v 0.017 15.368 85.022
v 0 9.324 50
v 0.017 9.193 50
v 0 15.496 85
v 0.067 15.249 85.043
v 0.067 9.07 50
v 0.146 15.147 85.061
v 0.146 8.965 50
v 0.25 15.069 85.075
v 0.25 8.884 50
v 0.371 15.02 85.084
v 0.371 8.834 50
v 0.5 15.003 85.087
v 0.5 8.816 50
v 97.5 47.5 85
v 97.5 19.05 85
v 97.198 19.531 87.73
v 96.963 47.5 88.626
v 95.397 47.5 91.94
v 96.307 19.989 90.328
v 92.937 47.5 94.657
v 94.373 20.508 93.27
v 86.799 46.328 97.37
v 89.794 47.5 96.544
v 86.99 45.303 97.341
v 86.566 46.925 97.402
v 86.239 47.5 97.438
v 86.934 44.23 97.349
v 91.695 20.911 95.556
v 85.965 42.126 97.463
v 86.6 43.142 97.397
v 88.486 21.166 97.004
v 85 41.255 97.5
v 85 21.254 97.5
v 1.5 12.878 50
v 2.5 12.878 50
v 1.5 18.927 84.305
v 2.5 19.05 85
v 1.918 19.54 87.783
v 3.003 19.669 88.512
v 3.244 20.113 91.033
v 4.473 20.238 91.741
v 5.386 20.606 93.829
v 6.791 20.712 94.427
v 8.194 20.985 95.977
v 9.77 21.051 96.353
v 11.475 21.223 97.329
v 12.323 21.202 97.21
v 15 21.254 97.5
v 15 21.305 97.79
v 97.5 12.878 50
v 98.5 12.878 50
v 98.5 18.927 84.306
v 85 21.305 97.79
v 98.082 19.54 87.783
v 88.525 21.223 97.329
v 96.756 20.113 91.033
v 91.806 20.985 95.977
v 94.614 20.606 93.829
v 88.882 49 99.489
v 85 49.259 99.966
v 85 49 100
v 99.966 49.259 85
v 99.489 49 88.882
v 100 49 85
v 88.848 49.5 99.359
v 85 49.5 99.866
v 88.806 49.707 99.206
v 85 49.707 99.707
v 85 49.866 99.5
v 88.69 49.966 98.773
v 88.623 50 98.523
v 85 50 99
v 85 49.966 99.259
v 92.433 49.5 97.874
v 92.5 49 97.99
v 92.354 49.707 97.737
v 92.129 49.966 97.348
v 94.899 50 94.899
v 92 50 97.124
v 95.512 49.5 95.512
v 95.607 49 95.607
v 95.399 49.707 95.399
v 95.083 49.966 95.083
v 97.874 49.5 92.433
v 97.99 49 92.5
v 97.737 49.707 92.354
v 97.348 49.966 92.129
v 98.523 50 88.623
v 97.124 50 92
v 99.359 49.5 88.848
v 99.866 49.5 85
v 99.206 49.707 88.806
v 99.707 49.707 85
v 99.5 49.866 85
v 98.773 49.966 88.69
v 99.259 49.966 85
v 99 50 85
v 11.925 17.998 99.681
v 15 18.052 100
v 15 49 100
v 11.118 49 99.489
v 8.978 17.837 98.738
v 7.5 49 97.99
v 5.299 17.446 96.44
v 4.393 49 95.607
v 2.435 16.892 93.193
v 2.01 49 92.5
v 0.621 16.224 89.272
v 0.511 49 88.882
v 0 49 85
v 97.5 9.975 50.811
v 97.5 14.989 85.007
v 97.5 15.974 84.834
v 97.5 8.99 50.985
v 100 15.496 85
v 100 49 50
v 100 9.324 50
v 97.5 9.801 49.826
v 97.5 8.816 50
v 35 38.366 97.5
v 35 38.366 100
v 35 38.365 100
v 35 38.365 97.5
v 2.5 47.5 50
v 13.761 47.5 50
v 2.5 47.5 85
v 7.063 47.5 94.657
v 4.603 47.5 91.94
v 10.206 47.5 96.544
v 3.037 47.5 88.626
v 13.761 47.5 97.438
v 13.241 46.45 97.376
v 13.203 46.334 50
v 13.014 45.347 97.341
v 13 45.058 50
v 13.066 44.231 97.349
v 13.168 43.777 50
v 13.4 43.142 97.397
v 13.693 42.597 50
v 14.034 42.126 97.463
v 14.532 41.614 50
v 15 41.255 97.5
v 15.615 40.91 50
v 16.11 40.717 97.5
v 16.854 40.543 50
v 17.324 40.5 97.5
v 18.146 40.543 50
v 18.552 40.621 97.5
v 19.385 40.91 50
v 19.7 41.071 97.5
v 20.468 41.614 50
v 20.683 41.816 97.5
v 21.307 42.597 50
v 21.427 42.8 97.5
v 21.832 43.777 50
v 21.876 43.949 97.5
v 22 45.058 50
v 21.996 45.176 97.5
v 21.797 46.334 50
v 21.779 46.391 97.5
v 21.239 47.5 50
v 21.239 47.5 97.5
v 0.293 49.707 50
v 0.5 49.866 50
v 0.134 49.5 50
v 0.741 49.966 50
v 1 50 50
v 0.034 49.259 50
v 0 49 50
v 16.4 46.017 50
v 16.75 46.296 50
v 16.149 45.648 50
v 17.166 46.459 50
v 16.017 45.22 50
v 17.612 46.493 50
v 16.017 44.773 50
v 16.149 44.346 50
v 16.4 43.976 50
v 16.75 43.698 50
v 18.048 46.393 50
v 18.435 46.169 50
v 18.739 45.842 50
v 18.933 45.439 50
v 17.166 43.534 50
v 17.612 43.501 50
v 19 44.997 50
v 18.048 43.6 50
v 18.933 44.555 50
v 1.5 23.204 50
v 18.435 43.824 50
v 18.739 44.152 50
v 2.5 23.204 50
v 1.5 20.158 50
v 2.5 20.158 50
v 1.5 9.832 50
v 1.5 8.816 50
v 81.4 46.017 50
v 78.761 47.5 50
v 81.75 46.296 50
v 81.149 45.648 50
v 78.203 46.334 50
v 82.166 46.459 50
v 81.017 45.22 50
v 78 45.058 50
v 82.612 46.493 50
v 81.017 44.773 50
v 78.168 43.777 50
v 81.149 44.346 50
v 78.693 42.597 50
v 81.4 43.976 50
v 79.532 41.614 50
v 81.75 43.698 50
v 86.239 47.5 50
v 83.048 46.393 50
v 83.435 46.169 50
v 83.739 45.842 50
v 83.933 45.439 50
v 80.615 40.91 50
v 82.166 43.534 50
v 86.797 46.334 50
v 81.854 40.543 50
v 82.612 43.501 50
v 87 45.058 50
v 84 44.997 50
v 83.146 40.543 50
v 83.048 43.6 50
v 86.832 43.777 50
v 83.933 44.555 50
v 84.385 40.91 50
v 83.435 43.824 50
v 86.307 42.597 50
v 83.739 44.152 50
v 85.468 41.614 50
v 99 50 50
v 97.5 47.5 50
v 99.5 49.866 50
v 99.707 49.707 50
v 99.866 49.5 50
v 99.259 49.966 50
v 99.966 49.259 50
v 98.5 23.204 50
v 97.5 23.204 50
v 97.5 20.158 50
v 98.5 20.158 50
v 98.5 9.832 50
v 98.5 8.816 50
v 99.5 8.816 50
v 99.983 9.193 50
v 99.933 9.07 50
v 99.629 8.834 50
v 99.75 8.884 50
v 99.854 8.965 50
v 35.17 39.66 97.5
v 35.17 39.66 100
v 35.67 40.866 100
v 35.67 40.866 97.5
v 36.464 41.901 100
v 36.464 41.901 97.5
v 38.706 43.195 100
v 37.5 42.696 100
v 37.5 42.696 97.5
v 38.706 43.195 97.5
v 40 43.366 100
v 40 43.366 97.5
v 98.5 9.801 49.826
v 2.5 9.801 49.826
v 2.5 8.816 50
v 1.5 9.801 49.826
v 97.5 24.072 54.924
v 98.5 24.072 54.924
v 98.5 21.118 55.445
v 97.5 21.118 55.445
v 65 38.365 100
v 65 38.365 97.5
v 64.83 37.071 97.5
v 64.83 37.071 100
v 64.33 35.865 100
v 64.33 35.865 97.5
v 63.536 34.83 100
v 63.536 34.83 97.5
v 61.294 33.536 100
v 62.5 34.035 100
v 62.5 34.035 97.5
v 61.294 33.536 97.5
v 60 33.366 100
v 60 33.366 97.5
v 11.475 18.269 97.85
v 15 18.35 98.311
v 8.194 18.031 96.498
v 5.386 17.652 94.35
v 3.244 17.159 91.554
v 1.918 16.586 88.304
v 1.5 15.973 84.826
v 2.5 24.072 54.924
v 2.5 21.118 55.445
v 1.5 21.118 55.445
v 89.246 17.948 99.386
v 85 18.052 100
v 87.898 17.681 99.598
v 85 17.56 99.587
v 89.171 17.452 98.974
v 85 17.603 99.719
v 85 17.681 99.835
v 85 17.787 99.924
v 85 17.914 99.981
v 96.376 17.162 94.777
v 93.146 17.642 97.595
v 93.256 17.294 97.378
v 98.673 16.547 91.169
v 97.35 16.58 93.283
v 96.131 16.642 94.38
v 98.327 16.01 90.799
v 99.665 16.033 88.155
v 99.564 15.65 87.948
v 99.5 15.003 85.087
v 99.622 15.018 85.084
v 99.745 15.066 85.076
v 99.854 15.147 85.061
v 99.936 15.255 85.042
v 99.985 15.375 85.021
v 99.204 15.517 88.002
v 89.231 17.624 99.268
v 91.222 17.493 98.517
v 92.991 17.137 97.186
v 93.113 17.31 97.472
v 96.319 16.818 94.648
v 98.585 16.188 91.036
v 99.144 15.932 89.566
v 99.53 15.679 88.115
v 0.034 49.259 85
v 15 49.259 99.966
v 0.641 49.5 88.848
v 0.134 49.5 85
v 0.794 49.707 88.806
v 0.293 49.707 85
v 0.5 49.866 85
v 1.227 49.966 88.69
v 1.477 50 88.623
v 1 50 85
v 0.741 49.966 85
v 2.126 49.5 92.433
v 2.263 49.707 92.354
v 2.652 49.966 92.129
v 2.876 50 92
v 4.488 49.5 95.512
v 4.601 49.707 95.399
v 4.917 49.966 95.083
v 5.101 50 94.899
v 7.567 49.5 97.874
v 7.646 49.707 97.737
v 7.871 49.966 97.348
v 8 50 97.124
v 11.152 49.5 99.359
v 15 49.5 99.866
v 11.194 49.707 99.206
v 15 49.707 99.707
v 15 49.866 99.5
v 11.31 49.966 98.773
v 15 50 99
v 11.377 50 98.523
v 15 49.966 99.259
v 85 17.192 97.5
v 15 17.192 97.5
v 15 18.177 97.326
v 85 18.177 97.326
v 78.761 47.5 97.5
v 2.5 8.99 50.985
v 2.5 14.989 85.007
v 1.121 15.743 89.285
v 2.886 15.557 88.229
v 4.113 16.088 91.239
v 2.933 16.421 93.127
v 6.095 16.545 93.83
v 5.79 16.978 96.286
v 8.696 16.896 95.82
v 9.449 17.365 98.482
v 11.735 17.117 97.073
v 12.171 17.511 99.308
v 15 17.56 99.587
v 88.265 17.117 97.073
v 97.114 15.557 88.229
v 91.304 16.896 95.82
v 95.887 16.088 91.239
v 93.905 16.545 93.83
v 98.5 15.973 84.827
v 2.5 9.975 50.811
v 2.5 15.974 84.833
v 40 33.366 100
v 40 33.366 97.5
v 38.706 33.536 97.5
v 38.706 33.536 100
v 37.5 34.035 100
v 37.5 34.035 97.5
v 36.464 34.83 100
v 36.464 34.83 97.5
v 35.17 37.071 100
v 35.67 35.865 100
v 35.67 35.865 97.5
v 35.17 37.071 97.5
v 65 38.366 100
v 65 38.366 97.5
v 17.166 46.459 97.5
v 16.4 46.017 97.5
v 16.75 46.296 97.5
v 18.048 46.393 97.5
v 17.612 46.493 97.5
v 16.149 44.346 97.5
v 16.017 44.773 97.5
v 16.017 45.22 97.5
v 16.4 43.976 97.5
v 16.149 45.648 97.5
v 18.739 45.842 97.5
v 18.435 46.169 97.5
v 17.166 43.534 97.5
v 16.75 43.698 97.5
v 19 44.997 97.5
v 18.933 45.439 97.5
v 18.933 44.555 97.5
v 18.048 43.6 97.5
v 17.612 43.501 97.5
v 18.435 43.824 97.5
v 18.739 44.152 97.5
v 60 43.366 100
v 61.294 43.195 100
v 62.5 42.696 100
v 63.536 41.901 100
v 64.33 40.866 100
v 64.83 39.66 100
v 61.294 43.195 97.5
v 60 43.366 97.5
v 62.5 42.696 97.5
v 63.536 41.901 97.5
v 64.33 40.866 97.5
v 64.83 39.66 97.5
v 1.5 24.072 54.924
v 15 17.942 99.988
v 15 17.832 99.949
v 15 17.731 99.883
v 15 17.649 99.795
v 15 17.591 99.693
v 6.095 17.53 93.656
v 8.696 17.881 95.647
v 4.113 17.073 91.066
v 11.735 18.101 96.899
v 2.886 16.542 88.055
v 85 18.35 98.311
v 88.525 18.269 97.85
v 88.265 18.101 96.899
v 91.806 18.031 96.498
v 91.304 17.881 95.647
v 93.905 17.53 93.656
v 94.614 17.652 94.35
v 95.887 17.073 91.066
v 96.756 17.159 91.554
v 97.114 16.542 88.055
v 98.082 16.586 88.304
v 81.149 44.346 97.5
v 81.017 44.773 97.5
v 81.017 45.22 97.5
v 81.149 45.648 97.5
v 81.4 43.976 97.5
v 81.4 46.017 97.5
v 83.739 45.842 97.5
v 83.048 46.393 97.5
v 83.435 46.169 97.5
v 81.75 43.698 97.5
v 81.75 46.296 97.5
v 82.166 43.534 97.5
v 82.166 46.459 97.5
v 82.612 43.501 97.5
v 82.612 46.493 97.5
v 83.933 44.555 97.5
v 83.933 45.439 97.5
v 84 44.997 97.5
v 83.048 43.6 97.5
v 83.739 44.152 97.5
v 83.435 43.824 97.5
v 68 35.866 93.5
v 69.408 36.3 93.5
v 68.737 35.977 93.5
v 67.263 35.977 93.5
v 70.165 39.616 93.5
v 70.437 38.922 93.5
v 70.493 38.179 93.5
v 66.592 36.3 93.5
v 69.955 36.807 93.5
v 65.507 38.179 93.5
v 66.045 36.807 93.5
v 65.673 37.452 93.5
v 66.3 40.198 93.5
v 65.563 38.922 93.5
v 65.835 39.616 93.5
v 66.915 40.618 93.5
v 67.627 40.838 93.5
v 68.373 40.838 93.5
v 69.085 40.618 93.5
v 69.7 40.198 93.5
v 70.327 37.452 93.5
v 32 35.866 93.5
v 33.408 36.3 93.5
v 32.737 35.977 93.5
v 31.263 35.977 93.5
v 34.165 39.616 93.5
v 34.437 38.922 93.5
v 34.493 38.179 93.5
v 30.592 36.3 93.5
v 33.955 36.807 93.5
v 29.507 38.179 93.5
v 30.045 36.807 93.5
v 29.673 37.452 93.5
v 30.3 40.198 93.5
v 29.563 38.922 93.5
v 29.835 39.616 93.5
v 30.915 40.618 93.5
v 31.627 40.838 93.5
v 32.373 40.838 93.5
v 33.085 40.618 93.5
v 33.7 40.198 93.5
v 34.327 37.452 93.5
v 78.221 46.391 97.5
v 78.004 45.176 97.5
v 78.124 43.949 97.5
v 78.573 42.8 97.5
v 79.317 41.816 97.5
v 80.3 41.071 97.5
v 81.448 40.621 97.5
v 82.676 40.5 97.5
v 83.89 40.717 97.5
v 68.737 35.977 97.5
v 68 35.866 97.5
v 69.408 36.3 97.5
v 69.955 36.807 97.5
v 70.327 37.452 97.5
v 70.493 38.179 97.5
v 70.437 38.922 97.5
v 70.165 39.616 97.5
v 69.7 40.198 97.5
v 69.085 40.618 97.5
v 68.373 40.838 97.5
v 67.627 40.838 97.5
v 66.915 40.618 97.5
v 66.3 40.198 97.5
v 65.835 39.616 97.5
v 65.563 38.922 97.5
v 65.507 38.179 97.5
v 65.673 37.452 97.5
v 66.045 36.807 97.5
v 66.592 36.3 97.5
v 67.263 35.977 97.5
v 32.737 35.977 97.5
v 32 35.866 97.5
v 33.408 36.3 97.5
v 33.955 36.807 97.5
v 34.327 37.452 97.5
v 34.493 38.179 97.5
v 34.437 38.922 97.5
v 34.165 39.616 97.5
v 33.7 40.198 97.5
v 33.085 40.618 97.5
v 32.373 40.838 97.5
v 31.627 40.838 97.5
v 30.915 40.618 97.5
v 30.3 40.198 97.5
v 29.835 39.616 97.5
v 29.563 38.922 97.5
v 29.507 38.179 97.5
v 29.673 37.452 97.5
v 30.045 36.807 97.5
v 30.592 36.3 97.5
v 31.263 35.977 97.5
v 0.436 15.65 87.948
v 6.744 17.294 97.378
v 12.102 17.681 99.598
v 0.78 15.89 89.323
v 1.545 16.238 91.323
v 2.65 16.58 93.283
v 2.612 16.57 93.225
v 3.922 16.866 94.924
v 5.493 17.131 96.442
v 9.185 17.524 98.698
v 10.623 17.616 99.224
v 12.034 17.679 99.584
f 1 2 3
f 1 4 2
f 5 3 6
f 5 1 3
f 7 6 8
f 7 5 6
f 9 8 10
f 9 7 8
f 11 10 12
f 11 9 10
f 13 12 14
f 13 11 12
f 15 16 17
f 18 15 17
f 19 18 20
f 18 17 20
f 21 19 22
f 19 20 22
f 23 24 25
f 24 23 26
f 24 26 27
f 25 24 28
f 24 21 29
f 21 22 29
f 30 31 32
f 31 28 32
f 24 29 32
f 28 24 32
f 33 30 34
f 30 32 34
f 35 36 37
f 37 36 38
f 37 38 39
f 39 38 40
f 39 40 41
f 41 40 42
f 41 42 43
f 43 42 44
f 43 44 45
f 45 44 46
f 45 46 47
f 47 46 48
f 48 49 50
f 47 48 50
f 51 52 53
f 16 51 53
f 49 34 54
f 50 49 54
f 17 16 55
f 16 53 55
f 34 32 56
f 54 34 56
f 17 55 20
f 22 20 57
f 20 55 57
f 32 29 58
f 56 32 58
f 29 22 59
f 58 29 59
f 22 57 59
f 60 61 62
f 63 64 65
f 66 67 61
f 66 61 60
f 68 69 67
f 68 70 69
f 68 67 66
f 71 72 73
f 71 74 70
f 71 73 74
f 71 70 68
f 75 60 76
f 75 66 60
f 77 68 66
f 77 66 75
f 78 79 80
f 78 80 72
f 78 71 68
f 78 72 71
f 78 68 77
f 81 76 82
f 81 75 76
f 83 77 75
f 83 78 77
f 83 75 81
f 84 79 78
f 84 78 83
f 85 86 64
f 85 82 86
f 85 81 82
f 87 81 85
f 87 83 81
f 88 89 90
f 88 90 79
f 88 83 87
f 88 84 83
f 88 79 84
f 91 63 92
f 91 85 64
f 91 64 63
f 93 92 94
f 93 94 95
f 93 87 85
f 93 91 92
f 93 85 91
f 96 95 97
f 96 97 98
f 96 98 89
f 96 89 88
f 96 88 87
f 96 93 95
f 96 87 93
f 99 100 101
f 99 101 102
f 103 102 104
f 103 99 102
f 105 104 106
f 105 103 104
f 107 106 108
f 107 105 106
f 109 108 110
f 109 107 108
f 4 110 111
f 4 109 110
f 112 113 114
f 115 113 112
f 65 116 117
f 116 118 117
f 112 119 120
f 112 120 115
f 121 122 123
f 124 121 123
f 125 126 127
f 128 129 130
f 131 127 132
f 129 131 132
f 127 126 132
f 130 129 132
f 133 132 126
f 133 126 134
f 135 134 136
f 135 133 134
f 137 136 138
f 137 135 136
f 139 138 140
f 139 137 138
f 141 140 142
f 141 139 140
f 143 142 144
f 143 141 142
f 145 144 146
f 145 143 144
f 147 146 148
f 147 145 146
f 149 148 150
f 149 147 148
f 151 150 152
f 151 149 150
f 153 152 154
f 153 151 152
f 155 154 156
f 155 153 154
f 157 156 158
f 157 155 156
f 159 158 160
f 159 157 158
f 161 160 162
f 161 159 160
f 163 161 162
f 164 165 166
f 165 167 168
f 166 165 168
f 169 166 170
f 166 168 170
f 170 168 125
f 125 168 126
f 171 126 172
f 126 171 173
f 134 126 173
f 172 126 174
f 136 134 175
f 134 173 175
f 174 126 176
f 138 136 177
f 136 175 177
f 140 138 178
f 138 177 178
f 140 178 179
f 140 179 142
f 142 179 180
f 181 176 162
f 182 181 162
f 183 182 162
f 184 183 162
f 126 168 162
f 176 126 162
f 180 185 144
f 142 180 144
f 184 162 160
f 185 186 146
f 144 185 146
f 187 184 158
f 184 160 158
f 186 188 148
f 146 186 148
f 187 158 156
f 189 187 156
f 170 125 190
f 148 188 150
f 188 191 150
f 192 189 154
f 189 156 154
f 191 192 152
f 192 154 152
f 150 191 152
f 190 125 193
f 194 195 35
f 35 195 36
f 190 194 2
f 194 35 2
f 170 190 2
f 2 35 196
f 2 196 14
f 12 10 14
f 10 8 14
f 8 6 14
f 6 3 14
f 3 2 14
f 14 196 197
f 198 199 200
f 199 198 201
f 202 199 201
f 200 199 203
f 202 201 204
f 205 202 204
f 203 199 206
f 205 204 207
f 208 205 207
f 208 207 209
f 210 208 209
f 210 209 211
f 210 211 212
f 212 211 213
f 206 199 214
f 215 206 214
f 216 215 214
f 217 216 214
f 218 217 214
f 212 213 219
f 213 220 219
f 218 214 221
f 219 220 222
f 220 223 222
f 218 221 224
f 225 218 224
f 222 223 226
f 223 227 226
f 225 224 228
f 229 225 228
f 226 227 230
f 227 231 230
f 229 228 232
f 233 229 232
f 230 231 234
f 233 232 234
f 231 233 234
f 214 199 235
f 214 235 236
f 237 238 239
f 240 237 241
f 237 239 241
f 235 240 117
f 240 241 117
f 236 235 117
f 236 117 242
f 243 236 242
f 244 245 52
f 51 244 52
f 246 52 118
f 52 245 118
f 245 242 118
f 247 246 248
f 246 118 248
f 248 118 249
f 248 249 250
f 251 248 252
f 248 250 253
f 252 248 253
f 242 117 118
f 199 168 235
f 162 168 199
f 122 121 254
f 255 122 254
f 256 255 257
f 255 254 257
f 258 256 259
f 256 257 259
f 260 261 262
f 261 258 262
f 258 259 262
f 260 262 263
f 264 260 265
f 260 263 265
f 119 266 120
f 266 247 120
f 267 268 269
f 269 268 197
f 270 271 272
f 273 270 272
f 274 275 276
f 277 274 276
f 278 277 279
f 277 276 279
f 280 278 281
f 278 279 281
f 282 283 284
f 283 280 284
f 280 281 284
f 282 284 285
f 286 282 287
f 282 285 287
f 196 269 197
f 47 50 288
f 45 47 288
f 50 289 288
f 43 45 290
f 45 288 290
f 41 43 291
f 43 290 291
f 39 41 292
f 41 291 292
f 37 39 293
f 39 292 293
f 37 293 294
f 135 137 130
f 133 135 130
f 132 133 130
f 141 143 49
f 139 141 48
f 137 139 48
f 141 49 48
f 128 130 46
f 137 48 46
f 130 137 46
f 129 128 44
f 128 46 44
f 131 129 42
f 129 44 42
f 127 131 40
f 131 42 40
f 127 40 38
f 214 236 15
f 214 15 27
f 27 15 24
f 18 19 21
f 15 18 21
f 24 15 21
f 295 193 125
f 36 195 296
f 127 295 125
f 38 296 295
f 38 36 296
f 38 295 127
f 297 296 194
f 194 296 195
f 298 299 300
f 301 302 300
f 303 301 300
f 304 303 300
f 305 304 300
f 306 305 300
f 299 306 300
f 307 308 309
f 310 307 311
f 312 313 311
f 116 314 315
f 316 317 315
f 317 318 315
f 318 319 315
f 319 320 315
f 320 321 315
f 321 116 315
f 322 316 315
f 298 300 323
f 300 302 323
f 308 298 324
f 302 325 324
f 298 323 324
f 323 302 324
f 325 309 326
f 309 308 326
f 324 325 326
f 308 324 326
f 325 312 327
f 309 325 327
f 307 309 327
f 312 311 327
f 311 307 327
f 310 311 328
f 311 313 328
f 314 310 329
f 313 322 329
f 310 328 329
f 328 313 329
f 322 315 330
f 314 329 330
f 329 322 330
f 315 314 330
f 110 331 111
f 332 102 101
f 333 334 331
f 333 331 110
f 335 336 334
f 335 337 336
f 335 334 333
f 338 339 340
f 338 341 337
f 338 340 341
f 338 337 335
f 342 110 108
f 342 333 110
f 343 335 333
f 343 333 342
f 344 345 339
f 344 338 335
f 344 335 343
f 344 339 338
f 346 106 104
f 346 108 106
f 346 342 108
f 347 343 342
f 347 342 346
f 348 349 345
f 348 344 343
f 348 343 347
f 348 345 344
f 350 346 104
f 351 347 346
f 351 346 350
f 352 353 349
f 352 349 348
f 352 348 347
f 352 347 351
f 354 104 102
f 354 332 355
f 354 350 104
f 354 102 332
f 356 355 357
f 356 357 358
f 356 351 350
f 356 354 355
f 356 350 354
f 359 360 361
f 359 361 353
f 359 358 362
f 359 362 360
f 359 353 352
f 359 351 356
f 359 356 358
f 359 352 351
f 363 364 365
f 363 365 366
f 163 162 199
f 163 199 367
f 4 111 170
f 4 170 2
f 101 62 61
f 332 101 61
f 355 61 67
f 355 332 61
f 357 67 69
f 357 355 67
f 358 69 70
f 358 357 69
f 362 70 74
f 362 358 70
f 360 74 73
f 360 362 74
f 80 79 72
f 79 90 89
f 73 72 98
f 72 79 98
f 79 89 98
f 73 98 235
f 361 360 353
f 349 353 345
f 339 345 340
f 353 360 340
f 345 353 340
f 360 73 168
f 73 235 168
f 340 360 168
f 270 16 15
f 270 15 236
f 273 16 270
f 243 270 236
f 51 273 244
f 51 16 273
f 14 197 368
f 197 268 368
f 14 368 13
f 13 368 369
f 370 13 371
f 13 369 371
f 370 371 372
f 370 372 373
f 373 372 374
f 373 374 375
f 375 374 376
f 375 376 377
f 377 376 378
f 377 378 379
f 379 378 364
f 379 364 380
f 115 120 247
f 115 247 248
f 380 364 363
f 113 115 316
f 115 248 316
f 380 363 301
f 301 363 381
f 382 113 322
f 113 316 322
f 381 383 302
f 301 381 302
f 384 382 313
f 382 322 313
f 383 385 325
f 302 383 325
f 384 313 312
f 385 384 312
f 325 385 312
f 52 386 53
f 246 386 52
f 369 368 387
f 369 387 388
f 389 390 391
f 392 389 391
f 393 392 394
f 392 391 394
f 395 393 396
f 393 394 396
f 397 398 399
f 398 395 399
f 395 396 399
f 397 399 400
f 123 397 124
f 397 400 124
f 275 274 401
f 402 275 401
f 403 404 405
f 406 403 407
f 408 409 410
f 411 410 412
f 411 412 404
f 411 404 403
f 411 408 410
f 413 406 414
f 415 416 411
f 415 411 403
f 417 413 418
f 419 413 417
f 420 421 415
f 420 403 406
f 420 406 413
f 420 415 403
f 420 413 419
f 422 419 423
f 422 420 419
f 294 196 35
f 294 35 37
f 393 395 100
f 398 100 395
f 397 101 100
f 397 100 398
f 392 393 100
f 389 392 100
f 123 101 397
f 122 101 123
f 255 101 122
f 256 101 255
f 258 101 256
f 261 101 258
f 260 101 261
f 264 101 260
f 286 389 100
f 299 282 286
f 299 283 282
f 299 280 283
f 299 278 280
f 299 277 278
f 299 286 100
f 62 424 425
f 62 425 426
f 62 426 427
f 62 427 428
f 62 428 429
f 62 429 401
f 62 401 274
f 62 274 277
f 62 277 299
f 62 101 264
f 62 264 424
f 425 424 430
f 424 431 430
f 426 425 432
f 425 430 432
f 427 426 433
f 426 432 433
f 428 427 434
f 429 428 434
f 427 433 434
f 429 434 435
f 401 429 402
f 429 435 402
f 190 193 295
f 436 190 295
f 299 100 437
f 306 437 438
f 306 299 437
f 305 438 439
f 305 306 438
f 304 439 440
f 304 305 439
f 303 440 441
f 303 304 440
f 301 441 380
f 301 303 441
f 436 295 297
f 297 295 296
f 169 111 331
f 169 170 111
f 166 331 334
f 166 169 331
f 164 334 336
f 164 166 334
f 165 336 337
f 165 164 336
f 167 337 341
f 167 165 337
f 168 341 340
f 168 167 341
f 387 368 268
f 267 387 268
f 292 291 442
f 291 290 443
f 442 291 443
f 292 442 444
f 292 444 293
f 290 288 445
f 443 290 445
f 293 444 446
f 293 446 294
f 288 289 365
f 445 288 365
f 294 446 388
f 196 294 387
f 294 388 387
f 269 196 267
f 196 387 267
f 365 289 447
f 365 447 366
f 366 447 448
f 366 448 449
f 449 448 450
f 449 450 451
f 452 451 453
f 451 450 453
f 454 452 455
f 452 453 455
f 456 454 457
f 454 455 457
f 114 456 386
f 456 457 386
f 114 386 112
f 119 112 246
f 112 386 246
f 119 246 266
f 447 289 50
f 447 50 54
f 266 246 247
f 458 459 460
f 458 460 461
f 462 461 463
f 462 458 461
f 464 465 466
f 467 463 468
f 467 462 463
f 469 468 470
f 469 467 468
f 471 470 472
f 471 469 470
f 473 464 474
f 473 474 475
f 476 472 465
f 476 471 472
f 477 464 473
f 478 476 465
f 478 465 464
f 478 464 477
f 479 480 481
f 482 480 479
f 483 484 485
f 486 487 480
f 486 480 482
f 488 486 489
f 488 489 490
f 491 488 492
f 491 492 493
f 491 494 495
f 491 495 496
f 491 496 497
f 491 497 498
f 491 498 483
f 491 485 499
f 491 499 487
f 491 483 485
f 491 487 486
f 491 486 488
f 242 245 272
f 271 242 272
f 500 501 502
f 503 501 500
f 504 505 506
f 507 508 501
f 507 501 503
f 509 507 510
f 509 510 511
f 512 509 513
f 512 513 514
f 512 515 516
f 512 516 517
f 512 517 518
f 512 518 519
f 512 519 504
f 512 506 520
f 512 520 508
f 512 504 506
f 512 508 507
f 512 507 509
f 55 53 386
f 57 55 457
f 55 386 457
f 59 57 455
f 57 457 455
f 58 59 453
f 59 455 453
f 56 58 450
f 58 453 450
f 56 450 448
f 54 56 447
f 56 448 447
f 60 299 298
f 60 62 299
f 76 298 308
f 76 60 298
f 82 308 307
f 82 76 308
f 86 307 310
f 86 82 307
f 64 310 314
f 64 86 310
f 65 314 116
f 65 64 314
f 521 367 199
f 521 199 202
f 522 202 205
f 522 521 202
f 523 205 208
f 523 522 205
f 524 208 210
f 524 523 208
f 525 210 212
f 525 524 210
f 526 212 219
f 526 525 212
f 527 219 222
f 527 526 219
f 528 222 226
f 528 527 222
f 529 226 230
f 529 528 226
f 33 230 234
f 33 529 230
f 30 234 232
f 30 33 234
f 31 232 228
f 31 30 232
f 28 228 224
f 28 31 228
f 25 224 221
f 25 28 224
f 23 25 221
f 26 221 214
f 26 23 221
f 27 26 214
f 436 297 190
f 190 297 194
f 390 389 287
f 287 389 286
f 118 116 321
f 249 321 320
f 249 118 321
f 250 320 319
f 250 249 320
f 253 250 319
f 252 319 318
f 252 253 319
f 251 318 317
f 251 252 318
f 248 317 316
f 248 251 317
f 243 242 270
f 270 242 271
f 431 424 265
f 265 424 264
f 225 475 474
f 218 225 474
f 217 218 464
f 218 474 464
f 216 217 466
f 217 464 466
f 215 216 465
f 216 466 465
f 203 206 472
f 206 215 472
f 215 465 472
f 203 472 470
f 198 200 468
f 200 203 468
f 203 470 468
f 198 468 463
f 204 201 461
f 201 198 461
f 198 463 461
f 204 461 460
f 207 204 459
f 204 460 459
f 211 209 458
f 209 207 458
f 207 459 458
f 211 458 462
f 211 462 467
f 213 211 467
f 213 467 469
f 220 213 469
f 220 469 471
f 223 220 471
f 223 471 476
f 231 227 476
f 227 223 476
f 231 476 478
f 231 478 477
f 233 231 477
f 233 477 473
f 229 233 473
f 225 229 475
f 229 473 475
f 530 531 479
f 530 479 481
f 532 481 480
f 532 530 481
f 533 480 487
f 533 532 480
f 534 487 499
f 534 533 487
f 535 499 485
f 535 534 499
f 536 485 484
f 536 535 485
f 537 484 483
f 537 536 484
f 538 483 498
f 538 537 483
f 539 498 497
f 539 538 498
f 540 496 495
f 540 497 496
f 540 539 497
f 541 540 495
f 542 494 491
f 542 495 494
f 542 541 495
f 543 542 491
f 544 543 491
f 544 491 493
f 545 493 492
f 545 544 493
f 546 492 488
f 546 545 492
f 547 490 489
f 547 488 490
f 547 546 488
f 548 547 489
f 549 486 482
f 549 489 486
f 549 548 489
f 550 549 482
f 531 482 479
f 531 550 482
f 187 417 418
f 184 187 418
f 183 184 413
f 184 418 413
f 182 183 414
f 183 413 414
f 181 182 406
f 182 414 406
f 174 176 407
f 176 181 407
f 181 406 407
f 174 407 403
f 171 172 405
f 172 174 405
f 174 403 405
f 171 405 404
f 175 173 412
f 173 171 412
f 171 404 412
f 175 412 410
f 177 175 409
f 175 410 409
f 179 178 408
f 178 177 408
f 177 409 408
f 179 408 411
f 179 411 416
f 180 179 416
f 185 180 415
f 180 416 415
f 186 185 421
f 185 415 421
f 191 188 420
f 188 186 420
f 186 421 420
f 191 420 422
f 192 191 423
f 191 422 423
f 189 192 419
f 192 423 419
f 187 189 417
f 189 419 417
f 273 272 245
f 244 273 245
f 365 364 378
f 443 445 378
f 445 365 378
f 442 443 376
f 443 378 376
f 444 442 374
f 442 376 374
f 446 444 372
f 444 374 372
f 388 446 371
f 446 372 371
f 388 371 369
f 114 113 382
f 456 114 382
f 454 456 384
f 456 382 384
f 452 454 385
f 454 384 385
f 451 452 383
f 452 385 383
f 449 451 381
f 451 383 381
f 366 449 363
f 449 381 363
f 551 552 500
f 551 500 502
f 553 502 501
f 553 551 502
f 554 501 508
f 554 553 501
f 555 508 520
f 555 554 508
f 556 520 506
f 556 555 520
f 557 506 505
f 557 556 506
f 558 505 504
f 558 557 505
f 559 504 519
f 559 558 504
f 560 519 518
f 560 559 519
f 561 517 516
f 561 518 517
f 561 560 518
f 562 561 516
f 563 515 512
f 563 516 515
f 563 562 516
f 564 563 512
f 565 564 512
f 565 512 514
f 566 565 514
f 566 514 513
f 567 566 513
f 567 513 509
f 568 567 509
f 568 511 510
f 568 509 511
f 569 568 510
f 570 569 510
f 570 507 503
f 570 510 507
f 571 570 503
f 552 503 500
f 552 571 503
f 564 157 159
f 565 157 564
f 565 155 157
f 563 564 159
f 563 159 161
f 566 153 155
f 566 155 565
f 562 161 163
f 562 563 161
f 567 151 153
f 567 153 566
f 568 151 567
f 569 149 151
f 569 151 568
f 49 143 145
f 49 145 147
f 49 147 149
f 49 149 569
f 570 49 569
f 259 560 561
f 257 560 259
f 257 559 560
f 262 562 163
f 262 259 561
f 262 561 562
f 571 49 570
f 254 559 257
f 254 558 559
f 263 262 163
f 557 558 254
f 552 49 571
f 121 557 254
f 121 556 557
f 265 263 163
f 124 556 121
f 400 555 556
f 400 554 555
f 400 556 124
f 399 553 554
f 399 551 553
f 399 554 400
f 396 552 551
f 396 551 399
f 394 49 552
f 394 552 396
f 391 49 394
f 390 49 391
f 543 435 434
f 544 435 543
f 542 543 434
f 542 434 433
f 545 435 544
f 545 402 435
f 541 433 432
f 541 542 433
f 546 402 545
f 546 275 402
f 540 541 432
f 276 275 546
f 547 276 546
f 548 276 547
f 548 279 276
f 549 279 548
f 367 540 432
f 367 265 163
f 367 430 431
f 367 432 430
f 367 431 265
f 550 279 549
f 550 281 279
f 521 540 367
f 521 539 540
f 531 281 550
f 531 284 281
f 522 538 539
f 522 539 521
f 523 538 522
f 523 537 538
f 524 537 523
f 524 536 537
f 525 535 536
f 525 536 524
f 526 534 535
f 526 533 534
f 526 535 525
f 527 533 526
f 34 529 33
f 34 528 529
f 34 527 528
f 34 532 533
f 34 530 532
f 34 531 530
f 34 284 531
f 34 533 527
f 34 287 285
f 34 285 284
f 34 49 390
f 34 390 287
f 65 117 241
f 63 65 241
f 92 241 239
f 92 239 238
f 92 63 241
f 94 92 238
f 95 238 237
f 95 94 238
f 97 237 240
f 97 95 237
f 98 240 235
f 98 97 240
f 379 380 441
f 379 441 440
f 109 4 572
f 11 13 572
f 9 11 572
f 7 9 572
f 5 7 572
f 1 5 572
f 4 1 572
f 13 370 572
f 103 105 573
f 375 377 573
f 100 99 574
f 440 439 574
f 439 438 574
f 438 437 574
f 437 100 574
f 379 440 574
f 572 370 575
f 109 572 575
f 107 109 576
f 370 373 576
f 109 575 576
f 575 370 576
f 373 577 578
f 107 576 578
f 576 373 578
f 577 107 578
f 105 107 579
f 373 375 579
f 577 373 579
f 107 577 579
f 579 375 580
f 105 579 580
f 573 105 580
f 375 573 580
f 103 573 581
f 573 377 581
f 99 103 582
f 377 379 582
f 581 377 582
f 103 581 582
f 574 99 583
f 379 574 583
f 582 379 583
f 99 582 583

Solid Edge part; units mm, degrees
sketch "Sketch1" plane through (0, 0, 0) normal (0, 0, 1) x (1, 0, 0)
  line L0 (100, 0) -> (100, 50)
  line L1 (100, 50) -> (0, 50)
  line L2 (0, 50) -> (0, 0)
  line L3 (0, 0) -> (100, 0)
extrude "Protrusion1" add sketch "Sketch1" along normal blind 100
fillet "Round_1" radius 15 4 edges at (100, 25, 100) (0, 25, 100) (100, 25, 0) (0, 25, 0)
sketch "Sketch2" plane through (50, 0, 50) normal (0, -1, 0) x (1, 0, 0)
  line L0 (-35, 47.5) -> (35, 47.5)
  arc A0 (35, 47.5) -> (47.5, 35) centre (35, 35) cw
  line L1 (47.5, 35) -> (47.5, -35)
  arc A1 (47.5, -35) -> (35, -47.5) centre (35, -35) cw
  line L2 (35, -47.5) -> (-35, -47.5)
  arc A2 (-35, -47.5) -> (-47.5, -35) centre (-35, -35) cw
  line L3 (-47.5, -35) -> (-47.5, 35)
  arc A3 (-47.5, 35) -> (-35, 47.5) centre (-35, 35) cw
extrude "ExtrudedCutout_2" cut sketch "Sketch2" against normal blind 47.5
sketch "Sketch3" plane through (100, 25, 50) normal (1, 0, 0) x (0, 1, 0)
  line L0 (-25, 50) -> (-25, -50)
  line L1 (-25, -50) -> (-7.3673, 50)
  line L2 (-7.3673, 50) -> (-25, 50)
extrude "ExtrudedCutout_3" cut sketch "Sketch3" against normal blind 100
sketch "Sketch4" plane through (100, 26.3225, 50) normal (1, 0, 0) x (0, 1, 0)
  line L0 (23.6775, 0) -> (-26.3225, 0)
  line L1 (-26.3225, 0) -> (-26.3225, -50)
  line L2 (-26.3225, -50) -> (23.6775, -50)
  line L3 (23.6775, -50) -> (23.6775, 0)
extrude "ExtrudedCutout_4" cut sketch "Sketch4" against normal blind 108.373
fillet "Round_2" radius 1 5 edges at (100, 50, 67.5) (95.6066, 50, 95.6066) (50, 50, 100) (4.3934, 50, 95.6066) (0, 50, 67.5)
sketch "Sketch5" plane through (50, 13.2245, 75) normal (0, -0.9848, 0.1736) x (1, 0, 0)
  line L0 (-35.0001, 23.8471) -> (35, 23.8471)
  arc A0 (35, 23.8471) -> (48.5, 10.1545) centre (35, 10.3457) cw
  line L1 (48.5, 10.1545) -> (48.5, -25.3857)
  line L2 (-48.5, -25.3857) -> (48.5, -25.3857)
  line L3 (-48.5, -25.3857) -> (-48.5, 10.1543)
  arc A1 (-35.0001, 23.8471) -> (-48.5, 10.1543) centre (-35.0001, 10.3459) ccw
extrude "ExtrudedCutout_5" cut sketch "Sketch5" against normal blind 4
sketch "Sketch6" plane through (50, 13.2245, 75) normal (0, -0.9848, 0.1736) x (1, 0, 0)
  line L0 (47.5, 10.1618) -> (47.5, -24.3857)
  line L1 (47.5, -25.3857) -> (47.5, -24.3857)
  line L2 (48.5, -25.3857) -> (47.5, -25.3857)
  line L3 (48.5, 10.1545) -> (48.5, -25.3857)
  arc A0 (35, 23.8471) -> (48.5, 10.1545) centre (35, 10.3457) cw
  line L4 (-35.0001, 23.8471) -> (35, 23.8471)
  arc A1 (-35.0001, 23.8471) -> (-48.5, 10.1543) centre (-35.0001, 10.3459) ccw
  line L5 (-48.5, -25.3857) -> (-48.5, 10.1543)
  line L6 (-47.5, -25.3856) -> (-48.5, -25.3857)
  line L7 (-47.5, -24.3857) -> (-47.5, -25.3856)
  line L8 (-47.5, -24.3857) -> (-47.5, 10.1615)
  arc A2 (-47.5, 10.1615) -> (-35.0001, 22.8471) centre (-35.0001, 10.3459) cw
  line L9 (-35.0001, 22.8471) -> (35, 22.8471)
  arc A3 (35, 22.8471) -> (47.5, 10.1618) centre (35, 10.3457) cw
extrude "ExtrudedProtrusion_5" add sketch "Sketch6" against normal blind 1
sketch "Sketch7" plane through (50, 33.3163, 100) normal (0, 0, 1) x (0, 1, 0)
  line L0 (10.0492, -15) -> (10.0492, 15)
  line L1 (10.0492, 15) -> (0.0492, 15)
  line L2 (0.0492, 15) -> (0.0492, -15)
  line L3 (0.0492, -15) -> (10.0492, -15)
extrude "ExtrudedCutout_6" cut sketch "Sketch7" against normal blind 2.5
sketch "Sketch8" plane through (50, 33.6152, 97.5) normal (0, 0, -1) x (0, -1, 0)
  circle A0 centre (-4.7503, 18) radius 2.5
  circle A1 centre (-4.7503, -18) radius 2.5
  dimension "D1" = 5
  dimension "D2" = 3
  dimension "D3" = 3
extrude "ExtrudedProtrusion_6" add sketch "Sketch8" along normal blind 4
fillet "Round_3" radius 5 4 edges at (35, 33.3655, 98.75) (35, 43.3655, 98.75) (65, 33.3655, 98.75) (65, 43.3655, 98.75)
sketch "Sketch9" plane through (50, 32.3459, 97.5) normal (0, 0, -1) x (1, 0, 0)
  circle A0 centre (-32.5, -12.6508) radius 4.5
  circle A1 centre (-32.5, -12.6508) radius 1.5
  circle A2 centre (32.5, -12.6508) radius 4.5
  circle A3 centre (32.5, -12.6508) radius 1.5
extrude "ExtrudedProtrusion_7" add sketch "Sketch9" along normal blind 47.5
fillet "Round_4" radius 0.5 5 edges at (0, 11.9021, 67.5) (4.3934, 16.858, 95.6066) (50, 17.6327, 100) (95.6066, 16.858, 95.6066) (100, 11.9021, 67.5)
sketch "Sketch10" plane through (100, 29.162, 67.5) normal (1, 0, 0) x (0, 1, 0)
  line L0 (-5.958, -17.5) -> (-5.0897, -12.576)
  line L1 (-5.0897, -12.576) -> (-8.0442, -12.055)
  line L2 (-8.0442, -12.055) -> (-9.0042, -17.5)
  line L3 (-9.0042, -17.5) -> (-5.958, -17.5)
extrude "Cutout1" cut sketch "Sketch10" against normal blind 138.0733
sketch "Sketch11" plane through (100, 29.162, 67.5) normal (1, 0, 0) x (0, 1, 0)
  line L0 (-5.958, -17.5) -> (-5.0897, -12.576)
  line L1 (-5.0897, -12.576) -> (-8.0442, -12.055)
  line L2 (-8.0442, -12.055) -> (-9.0042, -17.5)
  line L3 (-9.0042, -17.5) -> (-5.958, -17.5)
extrude "ExtrudedProtrusion_8" add sketch "Sketch11" against normal blind 1.5
sketch "Sketch12" plane through (0, 29.162, 67.5) normal (-1, 0, 0) x (0, -1, 0)
  line L0 (5.0897, -12.576) -> (5.958, -17.5)
  line L1 (5.958, -17.5) -> (9.0042, -17.5)
  line L2 (9.0042, -17.5) -> (8.0442, -12.055)
  line L3 (8.0442, -12.055) -> (5.0897, -12.576)
extrude "ExtrudedProtrusion_9" add sketch "Sketch12" against normal blind 1.5
properties material "ABS Plastic, high impact"
